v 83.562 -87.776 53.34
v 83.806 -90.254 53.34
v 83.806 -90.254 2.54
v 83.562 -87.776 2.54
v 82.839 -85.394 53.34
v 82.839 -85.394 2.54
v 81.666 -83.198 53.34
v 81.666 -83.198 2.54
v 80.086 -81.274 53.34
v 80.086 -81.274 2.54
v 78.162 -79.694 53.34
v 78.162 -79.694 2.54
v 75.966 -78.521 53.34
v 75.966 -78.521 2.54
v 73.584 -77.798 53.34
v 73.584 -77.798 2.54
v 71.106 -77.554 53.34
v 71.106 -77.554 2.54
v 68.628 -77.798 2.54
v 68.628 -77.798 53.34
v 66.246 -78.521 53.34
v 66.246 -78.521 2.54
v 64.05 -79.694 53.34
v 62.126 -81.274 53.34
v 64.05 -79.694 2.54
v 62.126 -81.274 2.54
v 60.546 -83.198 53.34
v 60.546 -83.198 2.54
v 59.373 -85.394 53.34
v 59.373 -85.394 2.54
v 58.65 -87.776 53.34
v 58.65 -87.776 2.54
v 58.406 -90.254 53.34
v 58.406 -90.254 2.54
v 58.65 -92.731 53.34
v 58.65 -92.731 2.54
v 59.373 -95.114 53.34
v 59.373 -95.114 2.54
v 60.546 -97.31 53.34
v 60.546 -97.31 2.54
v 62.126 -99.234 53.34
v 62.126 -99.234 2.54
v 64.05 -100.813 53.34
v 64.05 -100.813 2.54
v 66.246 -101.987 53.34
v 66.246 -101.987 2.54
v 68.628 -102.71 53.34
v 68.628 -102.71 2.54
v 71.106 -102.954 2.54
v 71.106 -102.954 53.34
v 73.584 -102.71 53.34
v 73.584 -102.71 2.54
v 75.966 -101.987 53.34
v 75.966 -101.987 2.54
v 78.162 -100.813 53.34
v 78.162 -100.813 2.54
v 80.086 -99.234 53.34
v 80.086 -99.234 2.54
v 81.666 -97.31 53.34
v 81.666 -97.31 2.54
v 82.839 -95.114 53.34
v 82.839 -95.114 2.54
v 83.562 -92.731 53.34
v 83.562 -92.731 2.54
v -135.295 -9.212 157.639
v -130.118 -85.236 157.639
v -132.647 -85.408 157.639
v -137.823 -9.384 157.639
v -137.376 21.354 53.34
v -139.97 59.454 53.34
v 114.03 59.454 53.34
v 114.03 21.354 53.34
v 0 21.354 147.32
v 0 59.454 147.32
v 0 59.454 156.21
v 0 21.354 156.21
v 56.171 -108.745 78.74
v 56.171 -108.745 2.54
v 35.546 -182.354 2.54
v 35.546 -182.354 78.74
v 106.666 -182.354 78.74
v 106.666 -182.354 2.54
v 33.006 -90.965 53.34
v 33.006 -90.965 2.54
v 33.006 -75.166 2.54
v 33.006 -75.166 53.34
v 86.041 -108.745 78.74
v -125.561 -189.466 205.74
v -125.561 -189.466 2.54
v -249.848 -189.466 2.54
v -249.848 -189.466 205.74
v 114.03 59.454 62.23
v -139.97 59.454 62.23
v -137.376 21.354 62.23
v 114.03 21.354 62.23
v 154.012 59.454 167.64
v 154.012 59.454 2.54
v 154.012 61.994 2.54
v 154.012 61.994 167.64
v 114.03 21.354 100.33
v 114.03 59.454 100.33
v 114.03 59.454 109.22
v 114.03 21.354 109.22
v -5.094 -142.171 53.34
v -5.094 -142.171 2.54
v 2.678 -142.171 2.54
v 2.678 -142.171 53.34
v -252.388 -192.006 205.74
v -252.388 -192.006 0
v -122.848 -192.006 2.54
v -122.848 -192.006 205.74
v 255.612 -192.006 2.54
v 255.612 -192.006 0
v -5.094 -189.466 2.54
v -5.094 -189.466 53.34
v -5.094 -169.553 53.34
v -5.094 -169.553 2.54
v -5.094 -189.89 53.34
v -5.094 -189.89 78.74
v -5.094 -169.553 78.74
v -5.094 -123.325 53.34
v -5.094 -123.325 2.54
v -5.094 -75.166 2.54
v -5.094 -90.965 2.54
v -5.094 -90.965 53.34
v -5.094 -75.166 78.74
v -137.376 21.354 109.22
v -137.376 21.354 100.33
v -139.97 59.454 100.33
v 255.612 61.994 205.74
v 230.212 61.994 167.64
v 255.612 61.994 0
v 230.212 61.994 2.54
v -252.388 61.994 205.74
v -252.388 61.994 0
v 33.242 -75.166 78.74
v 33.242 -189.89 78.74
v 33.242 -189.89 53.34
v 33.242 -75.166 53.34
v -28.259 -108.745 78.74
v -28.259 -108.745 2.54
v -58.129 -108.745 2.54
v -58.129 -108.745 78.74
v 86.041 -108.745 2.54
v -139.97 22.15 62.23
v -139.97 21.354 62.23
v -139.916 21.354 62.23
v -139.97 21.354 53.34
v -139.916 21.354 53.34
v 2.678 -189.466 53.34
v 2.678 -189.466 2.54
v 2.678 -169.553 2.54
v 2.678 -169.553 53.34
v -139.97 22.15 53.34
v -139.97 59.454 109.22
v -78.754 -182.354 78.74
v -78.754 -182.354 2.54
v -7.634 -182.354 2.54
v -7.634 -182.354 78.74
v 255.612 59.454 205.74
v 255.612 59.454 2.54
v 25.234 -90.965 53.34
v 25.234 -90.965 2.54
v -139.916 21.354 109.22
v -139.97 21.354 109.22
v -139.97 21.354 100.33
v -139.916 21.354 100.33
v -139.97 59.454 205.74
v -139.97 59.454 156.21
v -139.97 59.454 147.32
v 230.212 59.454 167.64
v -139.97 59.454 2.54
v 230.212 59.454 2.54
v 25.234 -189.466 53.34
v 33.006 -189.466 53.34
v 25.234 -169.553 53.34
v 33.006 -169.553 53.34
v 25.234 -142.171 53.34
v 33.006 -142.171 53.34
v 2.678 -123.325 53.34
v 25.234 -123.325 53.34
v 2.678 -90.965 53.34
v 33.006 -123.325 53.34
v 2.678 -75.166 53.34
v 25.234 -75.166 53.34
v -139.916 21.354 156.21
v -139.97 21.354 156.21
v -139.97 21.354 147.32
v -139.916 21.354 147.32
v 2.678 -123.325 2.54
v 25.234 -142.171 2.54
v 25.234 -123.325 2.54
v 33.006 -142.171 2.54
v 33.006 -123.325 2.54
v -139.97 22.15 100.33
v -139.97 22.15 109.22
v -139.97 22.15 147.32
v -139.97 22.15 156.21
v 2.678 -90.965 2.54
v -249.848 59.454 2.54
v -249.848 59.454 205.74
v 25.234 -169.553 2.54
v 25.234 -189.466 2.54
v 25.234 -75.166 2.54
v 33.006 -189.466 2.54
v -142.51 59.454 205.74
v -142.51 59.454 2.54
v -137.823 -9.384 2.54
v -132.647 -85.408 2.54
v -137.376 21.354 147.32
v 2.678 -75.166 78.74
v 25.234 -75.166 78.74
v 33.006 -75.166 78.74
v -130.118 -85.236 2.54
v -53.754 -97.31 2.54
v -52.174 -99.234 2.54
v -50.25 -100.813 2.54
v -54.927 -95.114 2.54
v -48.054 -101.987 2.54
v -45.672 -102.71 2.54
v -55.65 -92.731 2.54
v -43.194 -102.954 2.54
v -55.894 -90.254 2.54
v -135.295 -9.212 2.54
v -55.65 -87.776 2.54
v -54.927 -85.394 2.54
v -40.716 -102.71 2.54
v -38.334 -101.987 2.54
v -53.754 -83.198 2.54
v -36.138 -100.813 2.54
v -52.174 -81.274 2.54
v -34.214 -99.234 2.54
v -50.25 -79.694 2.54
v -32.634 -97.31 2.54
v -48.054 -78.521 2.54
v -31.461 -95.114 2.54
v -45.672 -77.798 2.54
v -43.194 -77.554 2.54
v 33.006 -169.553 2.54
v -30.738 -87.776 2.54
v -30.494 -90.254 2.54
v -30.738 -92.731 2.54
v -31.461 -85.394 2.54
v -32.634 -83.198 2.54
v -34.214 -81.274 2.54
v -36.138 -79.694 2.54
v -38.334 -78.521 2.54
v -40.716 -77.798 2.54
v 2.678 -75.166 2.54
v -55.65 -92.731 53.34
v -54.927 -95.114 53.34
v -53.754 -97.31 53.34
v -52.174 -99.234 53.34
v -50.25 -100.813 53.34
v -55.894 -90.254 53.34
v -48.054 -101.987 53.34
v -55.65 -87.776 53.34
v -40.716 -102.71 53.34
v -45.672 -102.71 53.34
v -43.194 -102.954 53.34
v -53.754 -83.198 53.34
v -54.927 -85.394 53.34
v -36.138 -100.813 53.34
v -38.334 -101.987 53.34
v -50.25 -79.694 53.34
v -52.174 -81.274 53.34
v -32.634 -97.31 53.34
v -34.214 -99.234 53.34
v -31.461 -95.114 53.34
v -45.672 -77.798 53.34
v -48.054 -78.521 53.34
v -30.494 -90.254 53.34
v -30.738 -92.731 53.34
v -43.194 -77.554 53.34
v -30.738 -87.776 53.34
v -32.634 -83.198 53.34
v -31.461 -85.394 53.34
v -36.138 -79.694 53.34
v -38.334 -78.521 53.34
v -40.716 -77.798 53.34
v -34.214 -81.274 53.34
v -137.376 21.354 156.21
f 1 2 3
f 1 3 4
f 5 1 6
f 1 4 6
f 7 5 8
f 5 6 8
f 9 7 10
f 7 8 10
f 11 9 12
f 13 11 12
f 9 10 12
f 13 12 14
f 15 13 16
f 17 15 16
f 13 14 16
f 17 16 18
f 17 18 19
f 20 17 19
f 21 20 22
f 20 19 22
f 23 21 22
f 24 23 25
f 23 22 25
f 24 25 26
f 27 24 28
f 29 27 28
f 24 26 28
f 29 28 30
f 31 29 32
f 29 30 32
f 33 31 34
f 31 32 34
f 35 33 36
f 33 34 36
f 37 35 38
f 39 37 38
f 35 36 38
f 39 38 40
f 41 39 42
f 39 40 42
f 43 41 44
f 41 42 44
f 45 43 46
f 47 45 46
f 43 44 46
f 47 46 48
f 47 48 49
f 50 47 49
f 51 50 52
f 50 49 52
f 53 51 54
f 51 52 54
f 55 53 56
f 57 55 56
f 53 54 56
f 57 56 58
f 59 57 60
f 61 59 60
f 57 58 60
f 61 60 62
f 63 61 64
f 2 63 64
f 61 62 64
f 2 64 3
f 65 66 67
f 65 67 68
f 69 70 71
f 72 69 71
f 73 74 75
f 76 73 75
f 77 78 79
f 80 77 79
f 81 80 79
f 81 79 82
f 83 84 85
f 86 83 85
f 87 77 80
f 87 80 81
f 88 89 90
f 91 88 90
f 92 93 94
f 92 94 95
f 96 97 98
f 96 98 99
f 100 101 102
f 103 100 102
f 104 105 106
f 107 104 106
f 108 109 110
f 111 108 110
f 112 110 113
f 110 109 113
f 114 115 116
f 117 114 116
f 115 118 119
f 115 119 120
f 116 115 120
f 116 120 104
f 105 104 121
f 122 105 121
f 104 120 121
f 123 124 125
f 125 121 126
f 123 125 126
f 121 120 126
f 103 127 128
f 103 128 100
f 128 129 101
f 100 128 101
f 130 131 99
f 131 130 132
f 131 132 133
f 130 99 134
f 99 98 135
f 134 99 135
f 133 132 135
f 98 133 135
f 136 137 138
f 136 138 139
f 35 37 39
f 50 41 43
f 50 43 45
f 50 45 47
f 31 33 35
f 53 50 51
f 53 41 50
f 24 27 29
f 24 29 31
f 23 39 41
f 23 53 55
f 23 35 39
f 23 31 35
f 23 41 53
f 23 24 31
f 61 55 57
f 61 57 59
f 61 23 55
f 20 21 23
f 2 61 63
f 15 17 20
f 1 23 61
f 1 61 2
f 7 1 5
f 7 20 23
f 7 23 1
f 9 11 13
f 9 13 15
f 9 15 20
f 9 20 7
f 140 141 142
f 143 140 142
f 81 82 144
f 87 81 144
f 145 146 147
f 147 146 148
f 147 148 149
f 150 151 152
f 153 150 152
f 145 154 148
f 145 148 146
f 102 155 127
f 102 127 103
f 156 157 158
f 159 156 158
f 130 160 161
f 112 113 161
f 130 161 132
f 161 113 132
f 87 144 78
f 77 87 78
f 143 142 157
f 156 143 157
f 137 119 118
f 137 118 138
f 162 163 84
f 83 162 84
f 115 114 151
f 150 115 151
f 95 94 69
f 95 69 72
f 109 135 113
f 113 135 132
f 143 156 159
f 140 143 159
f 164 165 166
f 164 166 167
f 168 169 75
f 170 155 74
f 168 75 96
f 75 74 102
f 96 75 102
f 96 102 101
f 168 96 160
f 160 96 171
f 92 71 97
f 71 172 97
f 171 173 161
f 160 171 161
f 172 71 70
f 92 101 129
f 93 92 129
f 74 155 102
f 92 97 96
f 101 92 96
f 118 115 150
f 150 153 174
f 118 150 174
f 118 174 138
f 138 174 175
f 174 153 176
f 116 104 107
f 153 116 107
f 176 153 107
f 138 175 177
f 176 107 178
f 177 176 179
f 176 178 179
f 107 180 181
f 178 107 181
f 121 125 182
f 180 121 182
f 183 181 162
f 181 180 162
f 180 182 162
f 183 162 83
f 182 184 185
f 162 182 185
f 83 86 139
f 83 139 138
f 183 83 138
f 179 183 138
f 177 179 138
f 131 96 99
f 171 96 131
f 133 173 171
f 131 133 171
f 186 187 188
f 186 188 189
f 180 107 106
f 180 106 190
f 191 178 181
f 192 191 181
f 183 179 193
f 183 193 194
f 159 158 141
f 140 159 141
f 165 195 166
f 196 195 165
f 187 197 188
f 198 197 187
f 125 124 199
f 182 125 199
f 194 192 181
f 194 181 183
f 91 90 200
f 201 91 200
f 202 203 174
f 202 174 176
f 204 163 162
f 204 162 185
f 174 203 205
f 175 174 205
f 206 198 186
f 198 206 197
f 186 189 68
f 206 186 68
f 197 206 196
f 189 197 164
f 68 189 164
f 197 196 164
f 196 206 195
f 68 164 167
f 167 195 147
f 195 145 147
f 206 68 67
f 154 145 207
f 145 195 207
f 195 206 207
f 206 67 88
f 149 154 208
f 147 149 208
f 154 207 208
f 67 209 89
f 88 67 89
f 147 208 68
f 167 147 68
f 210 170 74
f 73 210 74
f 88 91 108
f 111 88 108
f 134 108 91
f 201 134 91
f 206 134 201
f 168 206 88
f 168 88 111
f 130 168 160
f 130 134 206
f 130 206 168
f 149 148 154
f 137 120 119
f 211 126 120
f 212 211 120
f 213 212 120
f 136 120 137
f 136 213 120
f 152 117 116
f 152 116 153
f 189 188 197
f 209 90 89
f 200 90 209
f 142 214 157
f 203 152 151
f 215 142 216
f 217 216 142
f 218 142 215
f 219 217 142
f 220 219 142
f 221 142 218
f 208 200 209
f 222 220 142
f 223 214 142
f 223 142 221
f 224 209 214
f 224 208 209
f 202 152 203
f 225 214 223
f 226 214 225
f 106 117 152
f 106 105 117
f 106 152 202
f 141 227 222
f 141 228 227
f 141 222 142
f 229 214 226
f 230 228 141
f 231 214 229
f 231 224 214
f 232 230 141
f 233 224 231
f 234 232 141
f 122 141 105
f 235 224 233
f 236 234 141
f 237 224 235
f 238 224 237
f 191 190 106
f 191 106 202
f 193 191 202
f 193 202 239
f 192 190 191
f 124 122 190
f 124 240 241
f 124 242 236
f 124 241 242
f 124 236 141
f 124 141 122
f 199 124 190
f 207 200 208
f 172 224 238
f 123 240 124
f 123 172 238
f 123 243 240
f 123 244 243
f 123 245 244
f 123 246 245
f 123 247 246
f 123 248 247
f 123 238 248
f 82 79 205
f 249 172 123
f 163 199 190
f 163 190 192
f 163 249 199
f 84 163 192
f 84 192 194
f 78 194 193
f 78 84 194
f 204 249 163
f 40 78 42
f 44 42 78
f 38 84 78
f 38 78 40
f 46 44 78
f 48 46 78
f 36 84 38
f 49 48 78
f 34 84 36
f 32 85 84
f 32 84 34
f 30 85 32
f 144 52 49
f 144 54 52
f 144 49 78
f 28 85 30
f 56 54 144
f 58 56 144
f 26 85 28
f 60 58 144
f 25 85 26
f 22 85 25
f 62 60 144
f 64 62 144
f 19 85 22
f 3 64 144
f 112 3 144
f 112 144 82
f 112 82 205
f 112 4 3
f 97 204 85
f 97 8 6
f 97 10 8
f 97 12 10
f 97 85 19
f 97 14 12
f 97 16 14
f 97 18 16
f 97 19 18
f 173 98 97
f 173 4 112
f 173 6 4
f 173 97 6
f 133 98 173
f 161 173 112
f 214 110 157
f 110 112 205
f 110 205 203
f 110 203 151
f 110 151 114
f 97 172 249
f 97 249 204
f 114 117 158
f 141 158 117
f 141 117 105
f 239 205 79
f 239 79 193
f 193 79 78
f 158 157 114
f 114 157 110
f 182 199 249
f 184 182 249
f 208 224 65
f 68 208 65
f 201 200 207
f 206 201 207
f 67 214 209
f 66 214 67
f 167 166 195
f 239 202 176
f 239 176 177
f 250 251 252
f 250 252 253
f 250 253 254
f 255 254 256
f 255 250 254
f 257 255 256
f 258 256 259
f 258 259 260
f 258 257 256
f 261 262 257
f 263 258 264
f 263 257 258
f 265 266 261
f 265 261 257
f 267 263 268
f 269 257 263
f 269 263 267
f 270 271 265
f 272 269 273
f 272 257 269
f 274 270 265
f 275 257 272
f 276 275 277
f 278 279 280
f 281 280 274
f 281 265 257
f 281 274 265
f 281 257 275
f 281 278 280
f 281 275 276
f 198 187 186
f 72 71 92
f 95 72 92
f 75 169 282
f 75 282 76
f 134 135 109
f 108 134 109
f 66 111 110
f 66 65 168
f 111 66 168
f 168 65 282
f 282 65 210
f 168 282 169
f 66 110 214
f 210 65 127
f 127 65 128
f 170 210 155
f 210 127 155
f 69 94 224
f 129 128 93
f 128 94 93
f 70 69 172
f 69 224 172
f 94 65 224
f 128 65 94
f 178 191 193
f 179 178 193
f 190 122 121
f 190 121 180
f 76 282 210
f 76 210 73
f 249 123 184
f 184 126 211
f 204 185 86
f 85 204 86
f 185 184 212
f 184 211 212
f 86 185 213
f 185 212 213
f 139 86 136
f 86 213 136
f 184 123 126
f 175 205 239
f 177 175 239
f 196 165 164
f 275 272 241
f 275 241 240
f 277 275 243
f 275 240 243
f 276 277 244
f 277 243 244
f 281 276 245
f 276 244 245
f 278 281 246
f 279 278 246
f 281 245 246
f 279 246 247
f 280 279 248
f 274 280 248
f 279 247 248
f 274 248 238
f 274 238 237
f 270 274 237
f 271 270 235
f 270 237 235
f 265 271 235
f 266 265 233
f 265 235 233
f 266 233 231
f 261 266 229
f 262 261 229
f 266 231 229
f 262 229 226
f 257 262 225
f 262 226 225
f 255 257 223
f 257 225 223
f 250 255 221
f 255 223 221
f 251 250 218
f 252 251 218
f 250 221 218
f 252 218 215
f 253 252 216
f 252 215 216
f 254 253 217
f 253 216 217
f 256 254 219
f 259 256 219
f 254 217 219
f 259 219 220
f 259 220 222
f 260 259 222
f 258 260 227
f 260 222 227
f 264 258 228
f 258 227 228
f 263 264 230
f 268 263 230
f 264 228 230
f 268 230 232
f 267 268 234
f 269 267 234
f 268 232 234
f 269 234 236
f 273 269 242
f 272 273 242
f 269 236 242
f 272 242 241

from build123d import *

# Parameters (mm, degrees)
F0_W      = 508
F0_H      = 254
F1_DEPTH  = 2.54
F3_DEPTH  = 203.2
F5_DEPTH  = 203.2
F6_W      = 76.2
F6_H      = 155.0987733221
F7_DEPTH  = 25.4
F9_DEPTH  = 76.2
F10_W     = 7.7724000598
F10_H     = 15.7987965533
F10_H_2   = 18.846809864
F10_H_3   = 19.9136117986
F11_DEPTH = 76.2
F12_W     = 38.3358041449
F12_H     = 114.723880429
F13_DEPTH = 25.4
F14_R     = 12.7
F15_DEPTH = 50.8
F16_W     = 76.2
F16_H     = 165.1
F17_DEPTH = 25.4
F18_W     = 254
F18_H     = 8.89
F18_W_2   = 139.9702800131
F19_DEPTH = 38.1


with BuildPart() as f1:
    # F0 (on Top) → F1 (new body)
    with BuildSketch(Plane.XY):
        with Locations((1.6115792096, -65.0062360242)):
            Rectangle(F0_W, F0_H)
    extrude(amount=F1_DEPTH)

    # F2 (on face) → F3 (join)
    with BuildSketch(Plane.XY.offset(2.54)):
        Polygon((-252.3884207904, 61.9937639758), (-252.3884207904, -192.0062360242), (-249.8484207904, -192.0062360242), (-249.8484207904, 59.4537639758), (255.6115792096, 59.4537639758), (255.6115792096, 61.9937639758), align=None)
    extrude(amount=F3_DEPTH)

    # F4 (on face) → F5 (join)
    with BuildSketch(Plane.XY.offset(2.54)):
        Polygon((-249.8484207904, -189.4662360242), (-249.8484207904, -192.0062360242), (-122.8484207904, -192.0062360242), (-139.9702800131, 59.4537639758), (-142.5102800131, 59.4537639758), (-125.5613688634, -189.4662360242), align=None)
    extrude(amount=F5_DEPTH)

    # F6 (on face) → F7 (cut)
    with BuildSketch(Plane(origin=(-135.2948289897, -9.2121968326, 0), x_dir=(-0.0679324996, 0.9976899195, 0), z_dir=(0.9976899195, 0.0679324996, 0))):
        with Locations((-38.1, 80.0893866611)):
            Rectangle(F6_W, F6_H)
    extrude(amount=-F7_DEPTH, mode=Mode.SUBTRACT)

    # F8 (on face) → F9 (join)
    with BuildSketch(Plane.XY.offset(2.54)):
        Polygon((-78.7540227175, -182.3542267084), (-43.1940241251, -182.3542267084), (-7.6340255328, -182.3542267084), (-28.2588265836, -108.7450310588), (-43.1940241251, -108.7450310588), (-58.1292216666, -108.7450310588), align=None)
    extrude(amount=F9_DEPTH)

    # F10 (on face) → F11 (join)
    with BuildSketch(Plane.XY.offset(2.54)):
        with Locations((-1.2078255029, -83.0656343008)):
            Rectangle(F10_W, F10_H)
        with Locations((-1.2078255029, -132.7480375767)):
            Rectangle(F10_W, F10_H_2)
        with Locations((-1.2078255029, -179.5094301249)):
            Rectangle(F10_W, F10_H_3)
        with Locations((29.1197744374, -83.0656343008)):
            Rectangle(F10_W, F10_H)
        with Locations((29.1197744374, -132.7480375767)):
            Rectangle(F10_W, F10_H_2)
        with Locations((29.1197744374, -179.5094301249)):
            Rectangle(F10_W, F10_H_3)
        Polygon((86.0411706011, -108.7450310588), (56.1707755181, -108.7450310588), (35.5459744672, -182.3542267084), (106.665971652, -182.3542267084), align=None)
    extrude(amount=F11_DEPTH)

    # F12 (on face) → F13 (join)
    with BuildSketch(Plane.XY.offset(78.74)):
        with Locations((14.0738765397, -132.5281762387)):
            Rectangle(F12_W, F12_H)
    extrude(amount=-F13_DEPTH)

    # F14 (on face) → F15 (join)
    with BuildSketch(Plane.XY.offset(2.54)):
        with Locations((-43.1940241251, -90.2538299561)):
            Circle(F14_R)
        with Locations((71.1059730596, -90.2538299561)):
            Circle(F14_R)
    extrude(amount=F15_DEPTH)

    # F16 (on face) → F17 (cut)
    with BuildSketch(Plane.XZ.offset(-59.4537639758)):
        with Locations((192.1115792096, 85.09)):
            Rectangle(F16_W, F16_H)
    extrude(amount=-F17_DEPTH, mode=Mode.SUBTRACT)

    # F18 (on face) → F19 (join)
    with BuildSketch(Plane.XZ.offset(-59.4537639758)):
        with Locations((-12.9702800131, 57.785)):
            Rectangle(F18_W, F18_H)
        with Locations((-12.9702800131, 104.775)):
            Rectangle(F18_W, F18_H)
        with Locations((-69.9851400065, 151.765)):
            Rectangle(F18_W_2, F18_H)
    extrude(amount=F19_DEPTH)


solid = f1.part
